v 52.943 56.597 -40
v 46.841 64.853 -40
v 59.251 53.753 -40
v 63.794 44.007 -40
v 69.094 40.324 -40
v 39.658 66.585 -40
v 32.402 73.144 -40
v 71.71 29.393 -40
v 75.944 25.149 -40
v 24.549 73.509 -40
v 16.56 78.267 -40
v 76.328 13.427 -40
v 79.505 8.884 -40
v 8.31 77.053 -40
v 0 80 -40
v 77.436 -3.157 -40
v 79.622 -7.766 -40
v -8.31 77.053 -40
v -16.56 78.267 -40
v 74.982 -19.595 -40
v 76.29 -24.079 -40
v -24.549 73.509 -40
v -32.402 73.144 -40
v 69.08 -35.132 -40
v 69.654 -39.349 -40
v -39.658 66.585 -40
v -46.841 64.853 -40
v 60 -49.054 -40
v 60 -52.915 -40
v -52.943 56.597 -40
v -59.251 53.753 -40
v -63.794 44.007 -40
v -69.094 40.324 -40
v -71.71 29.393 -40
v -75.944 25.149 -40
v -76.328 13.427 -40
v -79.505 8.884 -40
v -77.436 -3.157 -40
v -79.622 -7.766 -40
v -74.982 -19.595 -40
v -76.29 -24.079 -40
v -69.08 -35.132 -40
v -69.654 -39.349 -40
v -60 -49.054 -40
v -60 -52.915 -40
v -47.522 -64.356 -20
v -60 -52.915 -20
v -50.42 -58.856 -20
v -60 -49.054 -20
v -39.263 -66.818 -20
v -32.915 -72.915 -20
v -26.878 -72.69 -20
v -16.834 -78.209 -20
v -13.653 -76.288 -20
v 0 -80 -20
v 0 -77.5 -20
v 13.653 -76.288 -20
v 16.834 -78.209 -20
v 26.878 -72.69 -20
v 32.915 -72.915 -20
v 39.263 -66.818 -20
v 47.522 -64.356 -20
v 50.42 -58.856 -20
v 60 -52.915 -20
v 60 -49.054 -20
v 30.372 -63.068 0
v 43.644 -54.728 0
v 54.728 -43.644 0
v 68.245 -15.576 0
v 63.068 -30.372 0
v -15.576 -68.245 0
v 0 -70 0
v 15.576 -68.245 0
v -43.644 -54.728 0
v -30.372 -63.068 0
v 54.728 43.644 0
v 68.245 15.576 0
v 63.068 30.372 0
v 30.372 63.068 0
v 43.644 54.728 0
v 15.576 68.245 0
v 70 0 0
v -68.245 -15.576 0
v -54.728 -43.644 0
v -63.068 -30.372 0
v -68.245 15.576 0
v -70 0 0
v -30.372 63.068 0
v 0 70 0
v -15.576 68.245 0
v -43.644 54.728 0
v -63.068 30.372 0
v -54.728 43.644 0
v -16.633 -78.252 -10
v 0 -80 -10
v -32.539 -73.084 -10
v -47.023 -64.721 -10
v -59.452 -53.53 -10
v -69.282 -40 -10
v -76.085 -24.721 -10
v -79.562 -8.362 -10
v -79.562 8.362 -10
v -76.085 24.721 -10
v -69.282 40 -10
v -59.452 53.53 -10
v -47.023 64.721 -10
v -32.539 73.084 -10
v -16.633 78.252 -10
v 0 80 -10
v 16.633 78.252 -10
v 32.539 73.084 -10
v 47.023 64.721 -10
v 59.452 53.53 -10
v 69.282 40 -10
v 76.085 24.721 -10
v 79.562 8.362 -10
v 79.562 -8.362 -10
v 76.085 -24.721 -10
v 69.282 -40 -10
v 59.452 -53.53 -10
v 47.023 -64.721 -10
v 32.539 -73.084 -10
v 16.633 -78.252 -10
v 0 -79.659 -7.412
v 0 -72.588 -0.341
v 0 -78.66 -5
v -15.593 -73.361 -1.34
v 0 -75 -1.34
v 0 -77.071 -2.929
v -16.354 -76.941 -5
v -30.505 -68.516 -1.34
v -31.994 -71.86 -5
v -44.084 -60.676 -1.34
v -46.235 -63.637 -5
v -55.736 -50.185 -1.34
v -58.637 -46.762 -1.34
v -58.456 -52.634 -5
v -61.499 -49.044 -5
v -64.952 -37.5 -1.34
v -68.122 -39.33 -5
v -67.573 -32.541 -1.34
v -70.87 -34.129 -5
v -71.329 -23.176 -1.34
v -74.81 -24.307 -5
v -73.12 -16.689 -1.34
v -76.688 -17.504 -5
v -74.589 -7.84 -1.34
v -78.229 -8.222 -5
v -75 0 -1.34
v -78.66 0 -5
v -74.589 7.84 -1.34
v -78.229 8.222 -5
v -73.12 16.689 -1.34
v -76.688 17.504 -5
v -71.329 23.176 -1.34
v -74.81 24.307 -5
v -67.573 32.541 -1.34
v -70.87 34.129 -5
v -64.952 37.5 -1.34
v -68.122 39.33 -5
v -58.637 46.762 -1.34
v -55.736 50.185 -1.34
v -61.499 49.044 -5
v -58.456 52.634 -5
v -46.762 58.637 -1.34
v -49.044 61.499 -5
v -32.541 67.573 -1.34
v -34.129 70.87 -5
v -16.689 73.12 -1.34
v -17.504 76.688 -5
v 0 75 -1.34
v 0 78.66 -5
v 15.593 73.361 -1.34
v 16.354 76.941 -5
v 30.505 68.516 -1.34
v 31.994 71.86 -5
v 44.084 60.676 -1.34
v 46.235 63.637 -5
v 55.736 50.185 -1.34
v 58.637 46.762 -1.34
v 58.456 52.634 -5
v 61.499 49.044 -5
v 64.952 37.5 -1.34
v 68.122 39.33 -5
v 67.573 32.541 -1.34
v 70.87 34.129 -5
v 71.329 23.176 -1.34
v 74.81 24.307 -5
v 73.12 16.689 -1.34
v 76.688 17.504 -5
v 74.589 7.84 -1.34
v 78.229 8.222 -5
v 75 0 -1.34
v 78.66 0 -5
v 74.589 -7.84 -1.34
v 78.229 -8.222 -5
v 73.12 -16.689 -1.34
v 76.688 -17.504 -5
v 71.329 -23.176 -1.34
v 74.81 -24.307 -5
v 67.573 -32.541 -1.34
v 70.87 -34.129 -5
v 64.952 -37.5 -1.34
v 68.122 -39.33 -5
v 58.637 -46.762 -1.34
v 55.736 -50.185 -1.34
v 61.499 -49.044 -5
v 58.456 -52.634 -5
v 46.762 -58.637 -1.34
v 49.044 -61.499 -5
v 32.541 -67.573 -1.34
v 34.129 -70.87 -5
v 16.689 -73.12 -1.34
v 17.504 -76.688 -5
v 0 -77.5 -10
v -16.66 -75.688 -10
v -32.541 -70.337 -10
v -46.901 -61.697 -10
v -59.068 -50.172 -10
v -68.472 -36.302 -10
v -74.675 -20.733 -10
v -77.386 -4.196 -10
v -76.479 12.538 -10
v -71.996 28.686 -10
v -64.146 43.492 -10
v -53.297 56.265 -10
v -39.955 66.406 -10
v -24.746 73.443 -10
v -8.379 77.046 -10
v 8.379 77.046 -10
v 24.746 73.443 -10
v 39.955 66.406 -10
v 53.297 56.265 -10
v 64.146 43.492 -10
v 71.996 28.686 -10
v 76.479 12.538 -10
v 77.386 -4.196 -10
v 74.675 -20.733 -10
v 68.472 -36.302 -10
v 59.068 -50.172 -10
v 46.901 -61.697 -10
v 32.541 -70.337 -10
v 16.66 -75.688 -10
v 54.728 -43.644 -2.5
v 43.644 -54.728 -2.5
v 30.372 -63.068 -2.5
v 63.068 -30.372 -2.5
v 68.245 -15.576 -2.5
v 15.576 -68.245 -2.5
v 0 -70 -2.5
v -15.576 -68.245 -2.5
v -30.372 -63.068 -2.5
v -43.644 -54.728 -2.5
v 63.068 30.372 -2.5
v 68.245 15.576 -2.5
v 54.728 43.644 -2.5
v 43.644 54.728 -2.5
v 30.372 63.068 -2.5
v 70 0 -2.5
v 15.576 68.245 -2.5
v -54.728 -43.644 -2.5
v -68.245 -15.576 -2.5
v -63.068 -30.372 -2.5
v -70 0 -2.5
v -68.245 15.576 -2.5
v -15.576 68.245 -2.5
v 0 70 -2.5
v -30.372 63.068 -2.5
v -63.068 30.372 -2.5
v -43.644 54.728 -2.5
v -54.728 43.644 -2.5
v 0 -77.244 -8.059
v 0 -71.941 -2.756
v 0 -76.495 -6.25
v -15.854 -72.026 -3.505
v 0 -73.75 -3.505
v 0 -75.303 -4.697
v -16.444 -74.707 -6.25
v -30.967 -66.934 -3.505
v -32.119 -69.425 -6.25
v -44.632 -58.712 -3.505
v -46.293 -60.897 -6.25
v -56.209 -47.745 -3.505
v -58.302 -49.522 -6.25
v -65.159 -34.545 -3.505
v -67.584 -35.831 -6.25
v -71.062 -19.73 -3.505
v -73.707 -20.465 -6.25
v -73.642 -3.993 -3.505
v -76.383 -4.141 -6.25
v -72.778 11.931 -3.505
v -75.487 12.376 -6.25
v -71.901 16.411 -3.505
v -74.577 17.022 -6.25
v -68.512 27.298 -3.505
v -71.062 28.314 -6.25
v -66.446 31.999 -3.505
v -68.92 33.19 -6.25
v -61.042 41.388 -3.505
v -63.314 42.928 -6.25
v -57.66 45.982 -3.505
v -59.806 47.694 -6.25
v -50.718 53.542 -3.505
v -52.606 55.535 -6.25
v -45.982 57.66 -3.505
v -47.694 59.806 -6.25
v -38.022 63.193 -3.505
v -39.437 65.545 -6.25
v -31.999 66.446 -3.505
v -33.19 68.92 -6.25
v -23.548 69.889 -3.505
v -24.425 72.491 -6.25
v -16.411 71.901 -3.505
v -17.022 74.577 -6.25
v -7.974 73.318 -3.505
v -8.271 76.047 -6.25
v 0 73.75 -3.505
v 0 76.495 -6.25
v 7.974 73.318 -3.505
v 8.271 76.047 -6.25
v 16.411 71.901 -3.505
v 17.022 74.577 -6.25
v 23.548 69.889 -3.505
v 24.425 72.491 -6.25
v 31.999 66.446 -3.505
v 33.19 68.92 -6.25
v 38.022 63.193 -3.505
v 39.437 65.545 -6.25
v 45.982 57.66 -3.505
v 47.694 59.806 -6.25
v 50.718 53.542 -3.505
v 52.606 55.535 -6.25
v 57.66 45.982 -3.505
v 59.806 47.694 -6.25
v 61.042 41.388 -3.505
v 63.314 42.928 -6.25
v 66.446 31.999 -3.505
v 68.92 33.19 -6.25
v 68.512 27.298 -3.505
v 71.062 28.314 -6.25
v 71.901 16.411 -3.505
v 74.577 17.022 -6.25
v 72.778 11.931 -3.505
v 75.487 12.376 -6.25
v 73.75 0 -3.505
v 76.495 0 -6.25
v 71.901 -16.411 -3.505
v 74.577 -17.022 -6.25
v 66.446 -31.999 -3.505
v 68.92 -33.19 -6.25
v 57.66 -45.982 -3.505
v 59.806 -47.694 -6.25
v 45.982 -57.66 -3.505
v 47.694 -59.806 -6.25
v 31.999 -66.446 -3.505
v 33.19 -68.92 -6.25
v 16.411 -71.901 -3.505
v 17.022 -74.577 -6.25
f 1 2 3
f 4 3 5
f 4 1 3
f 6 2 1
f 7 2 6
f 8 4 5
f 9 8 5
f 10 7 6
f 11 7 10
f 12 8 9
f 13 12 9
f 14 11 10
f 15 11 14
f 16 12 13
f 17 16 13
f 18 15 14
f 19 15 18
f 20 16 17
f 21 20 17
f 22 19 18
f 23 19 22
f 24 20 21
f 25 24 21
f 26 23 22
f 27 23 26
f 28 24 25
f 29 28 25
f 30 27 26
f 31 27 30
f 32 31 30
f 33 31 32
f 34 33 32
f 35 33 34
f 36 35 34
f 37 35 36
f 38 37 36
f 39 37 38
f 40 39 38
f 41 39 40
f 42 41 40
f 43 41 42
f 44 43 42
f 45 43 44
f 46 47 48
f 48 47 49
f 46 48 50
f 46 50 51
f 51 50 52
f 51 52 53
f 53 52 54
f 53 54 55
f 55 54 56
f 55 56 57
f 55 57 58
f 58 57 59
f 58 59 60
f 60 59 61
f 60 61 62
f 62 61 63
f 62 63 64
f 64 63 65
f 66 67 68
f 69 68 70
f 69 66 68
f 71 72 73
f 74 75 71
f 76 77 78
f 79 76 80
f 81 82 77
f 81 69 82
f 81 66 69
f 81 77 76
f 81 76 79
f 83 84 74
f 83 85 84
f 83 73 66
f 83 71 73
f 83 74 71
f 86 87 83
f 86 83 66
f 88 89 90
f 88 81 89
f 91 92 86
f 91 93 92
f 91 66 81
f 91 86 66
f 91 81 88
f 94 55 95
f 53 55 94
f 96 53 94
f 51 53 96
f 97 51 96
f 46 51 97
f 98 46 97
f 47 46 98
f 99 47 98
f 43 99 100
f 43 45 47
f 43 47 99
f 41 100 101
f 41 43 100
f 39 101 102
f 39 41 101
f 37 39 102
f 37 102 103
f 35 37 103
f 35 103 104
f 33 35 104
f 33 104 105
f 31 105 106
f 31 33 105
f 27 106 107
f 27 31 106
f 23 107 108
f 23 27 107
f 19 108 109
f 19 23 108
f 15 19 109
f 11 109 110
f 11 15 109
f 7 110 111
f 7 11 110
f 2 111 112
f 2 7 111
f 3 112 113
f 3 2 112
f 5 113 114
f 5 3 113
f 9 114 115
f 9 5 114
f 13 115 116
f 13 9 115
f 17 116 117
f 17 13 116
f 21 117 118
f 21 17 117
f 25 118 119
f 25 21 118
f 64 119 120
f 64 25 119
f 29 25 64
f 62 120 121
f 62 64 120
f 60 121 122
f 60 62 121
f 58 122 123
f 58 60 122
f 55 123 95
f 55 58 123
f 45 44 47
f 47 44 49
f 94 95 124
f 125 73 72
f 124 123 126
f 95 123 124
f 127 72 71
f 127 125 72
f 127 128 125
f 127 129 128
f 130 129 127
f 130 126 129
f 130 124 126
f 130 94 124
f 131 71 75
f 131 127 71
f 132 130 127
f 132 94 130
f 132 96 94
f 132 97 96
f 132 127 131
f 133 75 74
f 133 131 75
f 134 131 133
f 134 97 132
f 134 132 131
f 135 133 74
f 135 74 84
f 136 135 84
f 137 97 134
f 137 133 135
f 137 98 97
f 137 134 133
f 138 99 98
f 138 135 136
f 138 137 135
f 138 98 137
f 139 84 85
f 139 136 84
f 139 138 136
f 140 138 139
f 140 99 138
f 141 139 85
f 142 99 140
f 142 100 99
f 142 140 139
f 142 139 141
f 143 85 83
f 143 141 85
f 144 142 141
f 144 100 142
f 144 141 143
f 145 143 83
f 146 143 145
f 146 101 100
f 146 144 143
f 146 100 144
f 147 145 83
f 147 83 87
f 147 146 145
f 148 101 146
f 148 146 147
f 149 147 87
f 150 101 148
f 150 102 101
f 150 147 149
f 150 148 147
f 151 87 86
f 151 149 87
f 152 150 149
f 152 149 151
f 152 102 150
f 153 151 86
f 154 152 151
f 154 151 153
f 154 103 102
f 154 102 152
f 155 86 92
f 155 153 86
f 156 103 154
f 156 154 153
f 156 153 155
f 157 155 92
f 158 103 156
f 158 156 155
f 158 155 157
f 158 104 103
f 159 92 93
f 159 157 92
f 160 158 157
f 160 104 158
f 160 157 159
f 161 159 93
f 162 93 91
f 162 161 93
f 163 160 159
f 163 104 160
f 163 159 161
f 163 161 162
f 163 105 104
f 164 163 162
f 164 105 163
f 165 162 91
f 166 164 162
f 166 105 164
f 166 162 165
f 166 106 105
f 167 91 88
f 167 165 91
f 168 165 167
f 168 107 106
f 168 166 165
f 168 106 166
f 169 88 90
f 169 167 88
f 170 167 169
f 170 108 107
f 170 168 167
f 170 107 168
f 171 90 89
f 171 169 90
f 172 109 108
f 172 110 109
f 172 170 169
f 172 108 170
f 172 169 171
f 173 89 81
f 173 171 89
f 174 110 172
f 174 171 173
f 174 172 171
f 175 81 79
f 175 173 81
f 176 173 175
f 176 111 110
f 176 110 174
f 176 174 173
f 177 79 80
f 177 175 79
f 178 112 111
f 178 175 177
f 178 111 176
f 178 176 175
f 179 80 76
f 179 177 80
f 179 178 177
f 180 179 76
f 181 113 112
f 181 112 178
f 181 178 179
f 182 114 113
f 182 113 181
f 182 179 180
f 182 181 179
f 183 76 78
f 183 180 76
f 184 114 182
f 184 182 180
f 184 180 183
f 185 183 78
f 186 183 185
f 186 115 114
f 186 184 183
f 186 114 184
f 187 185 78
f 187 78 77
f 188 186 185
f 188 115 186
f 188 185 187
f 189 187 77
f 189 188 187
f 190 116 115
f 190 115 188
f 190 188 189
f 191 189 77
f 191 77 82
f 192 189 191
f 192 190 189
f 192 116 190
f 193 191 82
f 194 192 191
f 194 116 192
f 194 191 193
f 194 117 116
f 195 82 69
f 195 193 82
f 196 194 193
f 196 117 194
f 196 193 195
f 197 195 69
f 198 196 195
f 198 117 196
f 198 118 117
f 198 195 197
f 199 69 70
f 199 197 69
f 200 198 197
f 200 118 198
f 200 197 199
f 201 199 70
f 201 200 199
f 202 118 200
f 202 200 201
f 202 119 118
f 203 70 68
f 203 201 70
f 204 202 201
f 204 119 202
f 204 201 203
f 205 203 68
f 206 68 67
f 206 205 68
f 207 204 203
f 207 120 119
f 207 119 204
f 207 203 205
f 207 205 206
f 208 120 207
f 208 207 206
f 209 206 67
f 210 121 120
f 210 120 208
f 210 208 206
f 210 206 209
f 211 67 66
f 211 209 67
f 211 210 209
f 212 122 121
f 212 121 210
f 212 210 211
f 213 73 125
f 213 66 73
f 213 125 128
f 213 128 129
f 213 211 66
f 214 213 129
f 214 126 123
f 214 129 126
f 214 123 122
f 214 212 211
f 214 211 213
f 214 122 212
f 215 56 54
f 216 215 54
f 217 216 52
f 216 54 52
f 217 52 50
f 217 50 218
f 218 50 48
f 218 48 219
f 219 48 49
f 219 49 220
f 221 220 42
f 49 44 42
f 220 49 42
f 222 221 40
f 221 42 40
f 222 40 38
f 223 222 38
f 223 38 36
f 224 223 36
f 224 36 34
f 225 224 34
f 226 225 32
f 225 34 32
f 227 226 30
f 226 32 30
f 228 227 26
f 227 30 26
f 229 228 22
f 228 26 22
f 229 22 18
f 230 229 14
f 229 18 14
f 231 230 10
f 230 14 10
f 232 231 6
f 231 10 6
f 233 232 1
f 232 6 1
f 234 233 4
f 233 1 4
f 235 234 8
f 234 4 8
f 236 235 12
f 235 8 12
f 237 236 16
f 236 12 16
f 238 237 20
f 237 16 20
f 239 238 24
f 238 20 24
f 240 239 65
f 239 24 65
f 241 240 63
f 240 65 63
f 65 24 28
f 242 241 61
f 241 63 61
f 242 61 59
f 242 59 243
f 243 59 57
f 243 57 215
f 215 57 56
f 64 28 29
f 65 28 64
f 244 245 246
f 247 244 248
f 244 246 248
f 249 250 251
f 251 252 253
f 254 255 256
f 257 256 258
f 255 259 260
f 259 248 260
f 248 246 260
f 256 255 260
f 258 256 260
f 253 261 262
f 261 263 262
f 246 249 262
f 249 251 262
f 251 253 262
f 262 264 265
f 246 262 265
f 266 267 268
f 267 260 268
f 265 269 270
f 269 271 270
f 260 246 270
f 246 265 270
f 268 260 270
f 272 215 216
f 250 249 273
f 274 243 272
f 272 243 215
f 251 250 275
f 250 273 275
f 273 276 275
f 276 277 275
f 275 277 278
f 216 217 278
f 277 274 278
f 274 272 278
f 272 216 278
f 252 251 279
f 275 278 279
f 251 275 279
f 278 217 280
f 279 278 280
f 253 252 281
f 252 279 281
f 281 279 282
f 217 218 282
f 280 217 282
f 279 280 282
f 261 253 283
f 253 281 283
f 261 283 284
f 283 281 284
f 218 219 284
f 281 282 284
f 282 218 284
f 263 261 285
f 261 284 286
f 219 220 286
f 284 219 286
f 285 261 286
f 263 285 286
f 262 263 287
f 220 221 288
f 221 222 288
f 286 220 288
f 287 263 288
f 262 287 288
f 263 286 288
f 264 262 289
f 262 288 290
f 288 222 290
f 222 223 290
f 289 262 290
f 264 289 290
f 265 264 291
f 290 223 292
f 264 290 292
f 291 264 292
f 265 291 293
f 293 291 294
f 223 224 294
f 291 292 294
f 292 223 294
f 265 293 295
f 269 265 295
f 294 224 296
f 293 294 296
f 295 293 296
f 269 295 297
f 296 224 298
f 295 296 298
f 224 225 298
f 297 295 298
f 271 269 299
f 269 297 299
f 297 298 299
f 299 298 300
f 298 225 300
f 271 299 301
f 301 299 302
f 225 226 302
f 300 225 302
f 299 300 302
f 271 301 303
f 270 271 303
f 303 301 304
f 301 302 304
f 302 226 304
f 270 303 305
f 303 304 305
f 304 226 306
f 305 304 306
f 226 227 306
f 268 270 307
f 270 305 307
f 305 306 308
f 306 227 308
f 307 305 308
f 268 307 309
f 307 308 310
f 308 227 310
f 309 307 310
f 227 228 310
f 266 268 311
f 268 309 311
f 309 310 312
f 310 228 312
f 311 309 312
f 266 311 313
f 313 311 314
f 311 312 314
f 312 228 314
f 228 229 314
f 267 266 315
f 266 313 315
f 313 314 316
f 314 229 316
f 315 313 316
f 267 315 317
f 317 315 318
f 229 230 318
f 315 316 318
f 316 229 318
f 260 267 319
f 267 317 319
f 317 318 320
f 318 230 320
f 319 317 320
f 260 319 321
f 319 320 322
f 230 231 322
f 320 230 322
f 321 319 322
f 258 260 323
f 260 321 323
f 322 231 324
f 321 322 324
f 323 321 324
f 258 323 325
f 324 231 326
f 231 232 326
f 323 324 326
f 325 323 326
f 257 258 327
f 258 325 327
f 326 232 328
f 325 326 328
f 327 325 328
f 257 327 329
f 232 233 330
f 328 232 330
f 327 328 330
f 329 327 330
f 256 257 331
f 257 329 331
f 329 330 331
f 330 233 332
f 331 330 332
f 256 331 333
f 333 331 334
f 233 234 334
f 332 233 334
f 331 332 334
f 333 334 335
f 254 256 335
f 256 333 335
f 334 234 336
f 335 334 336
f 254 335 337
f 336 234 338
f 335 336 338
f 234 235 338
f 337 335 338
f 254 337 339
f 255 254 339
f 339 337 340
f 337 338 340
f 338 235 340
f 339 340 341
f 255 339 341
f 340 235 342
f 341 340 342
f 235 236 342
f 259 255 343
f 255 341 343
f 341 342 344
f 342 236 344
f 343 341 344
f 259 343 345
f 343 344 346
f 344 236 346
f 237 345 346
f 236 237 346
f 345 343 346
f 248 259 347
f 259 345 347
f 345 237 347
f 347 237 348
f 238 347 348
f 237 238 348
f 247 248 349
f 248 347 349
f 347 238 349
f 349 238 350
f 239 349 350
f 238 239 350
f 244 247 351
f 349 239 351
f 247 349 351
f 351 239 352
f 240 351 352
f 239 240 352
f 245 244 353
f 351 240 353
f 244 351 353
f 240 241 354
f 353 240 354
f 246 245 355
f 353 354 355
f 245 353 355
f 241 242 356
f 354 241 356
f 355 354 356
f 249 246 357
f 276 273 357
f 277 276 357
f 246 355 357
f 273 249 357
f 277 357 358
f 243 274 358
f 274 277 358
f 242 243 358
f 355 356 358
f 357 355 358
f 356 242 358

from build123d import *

# Parameters (mm, degrees)
F2_T     = -2.5
F3_W     = 120
F3_H     = 30
F4_DEPTH = 100


with BuildPart() as f1:
    # F0 (on Right) → F1 (revolve)
    with BuildSketch(Plane.YZ):
        with BuildLine():
            Line((-80, -10), (-80, -40))
            Line((-80, -40), (0, -40))
            Line((0, -40), (0, 0))
            Line((0, 0), (-70, 0))
            ThreePointArc((-70, 0), (-77.071068, -2.928932), (-80, -10))
        make_face()
    revolve(axis=Axis((0, 0, -20), (0, 0, -1)))

    # F2
    f2_openings = [f1.faces().sort_by_distance(p)[0] for p in [
        (0, 0, -40),
    ]]
    offset(amount=F2_T, openings=f2_openings)

    # F3 (on Front) → F4 (cut)
    with BuildSketch(Plane.XZ):
        with Locations((0, -35)):
            Rectangle(F3_W, F3_H)
    extrude(amount=F4_DEPTH, mode=Mode.SUBTRACT)


solid = f1.part
